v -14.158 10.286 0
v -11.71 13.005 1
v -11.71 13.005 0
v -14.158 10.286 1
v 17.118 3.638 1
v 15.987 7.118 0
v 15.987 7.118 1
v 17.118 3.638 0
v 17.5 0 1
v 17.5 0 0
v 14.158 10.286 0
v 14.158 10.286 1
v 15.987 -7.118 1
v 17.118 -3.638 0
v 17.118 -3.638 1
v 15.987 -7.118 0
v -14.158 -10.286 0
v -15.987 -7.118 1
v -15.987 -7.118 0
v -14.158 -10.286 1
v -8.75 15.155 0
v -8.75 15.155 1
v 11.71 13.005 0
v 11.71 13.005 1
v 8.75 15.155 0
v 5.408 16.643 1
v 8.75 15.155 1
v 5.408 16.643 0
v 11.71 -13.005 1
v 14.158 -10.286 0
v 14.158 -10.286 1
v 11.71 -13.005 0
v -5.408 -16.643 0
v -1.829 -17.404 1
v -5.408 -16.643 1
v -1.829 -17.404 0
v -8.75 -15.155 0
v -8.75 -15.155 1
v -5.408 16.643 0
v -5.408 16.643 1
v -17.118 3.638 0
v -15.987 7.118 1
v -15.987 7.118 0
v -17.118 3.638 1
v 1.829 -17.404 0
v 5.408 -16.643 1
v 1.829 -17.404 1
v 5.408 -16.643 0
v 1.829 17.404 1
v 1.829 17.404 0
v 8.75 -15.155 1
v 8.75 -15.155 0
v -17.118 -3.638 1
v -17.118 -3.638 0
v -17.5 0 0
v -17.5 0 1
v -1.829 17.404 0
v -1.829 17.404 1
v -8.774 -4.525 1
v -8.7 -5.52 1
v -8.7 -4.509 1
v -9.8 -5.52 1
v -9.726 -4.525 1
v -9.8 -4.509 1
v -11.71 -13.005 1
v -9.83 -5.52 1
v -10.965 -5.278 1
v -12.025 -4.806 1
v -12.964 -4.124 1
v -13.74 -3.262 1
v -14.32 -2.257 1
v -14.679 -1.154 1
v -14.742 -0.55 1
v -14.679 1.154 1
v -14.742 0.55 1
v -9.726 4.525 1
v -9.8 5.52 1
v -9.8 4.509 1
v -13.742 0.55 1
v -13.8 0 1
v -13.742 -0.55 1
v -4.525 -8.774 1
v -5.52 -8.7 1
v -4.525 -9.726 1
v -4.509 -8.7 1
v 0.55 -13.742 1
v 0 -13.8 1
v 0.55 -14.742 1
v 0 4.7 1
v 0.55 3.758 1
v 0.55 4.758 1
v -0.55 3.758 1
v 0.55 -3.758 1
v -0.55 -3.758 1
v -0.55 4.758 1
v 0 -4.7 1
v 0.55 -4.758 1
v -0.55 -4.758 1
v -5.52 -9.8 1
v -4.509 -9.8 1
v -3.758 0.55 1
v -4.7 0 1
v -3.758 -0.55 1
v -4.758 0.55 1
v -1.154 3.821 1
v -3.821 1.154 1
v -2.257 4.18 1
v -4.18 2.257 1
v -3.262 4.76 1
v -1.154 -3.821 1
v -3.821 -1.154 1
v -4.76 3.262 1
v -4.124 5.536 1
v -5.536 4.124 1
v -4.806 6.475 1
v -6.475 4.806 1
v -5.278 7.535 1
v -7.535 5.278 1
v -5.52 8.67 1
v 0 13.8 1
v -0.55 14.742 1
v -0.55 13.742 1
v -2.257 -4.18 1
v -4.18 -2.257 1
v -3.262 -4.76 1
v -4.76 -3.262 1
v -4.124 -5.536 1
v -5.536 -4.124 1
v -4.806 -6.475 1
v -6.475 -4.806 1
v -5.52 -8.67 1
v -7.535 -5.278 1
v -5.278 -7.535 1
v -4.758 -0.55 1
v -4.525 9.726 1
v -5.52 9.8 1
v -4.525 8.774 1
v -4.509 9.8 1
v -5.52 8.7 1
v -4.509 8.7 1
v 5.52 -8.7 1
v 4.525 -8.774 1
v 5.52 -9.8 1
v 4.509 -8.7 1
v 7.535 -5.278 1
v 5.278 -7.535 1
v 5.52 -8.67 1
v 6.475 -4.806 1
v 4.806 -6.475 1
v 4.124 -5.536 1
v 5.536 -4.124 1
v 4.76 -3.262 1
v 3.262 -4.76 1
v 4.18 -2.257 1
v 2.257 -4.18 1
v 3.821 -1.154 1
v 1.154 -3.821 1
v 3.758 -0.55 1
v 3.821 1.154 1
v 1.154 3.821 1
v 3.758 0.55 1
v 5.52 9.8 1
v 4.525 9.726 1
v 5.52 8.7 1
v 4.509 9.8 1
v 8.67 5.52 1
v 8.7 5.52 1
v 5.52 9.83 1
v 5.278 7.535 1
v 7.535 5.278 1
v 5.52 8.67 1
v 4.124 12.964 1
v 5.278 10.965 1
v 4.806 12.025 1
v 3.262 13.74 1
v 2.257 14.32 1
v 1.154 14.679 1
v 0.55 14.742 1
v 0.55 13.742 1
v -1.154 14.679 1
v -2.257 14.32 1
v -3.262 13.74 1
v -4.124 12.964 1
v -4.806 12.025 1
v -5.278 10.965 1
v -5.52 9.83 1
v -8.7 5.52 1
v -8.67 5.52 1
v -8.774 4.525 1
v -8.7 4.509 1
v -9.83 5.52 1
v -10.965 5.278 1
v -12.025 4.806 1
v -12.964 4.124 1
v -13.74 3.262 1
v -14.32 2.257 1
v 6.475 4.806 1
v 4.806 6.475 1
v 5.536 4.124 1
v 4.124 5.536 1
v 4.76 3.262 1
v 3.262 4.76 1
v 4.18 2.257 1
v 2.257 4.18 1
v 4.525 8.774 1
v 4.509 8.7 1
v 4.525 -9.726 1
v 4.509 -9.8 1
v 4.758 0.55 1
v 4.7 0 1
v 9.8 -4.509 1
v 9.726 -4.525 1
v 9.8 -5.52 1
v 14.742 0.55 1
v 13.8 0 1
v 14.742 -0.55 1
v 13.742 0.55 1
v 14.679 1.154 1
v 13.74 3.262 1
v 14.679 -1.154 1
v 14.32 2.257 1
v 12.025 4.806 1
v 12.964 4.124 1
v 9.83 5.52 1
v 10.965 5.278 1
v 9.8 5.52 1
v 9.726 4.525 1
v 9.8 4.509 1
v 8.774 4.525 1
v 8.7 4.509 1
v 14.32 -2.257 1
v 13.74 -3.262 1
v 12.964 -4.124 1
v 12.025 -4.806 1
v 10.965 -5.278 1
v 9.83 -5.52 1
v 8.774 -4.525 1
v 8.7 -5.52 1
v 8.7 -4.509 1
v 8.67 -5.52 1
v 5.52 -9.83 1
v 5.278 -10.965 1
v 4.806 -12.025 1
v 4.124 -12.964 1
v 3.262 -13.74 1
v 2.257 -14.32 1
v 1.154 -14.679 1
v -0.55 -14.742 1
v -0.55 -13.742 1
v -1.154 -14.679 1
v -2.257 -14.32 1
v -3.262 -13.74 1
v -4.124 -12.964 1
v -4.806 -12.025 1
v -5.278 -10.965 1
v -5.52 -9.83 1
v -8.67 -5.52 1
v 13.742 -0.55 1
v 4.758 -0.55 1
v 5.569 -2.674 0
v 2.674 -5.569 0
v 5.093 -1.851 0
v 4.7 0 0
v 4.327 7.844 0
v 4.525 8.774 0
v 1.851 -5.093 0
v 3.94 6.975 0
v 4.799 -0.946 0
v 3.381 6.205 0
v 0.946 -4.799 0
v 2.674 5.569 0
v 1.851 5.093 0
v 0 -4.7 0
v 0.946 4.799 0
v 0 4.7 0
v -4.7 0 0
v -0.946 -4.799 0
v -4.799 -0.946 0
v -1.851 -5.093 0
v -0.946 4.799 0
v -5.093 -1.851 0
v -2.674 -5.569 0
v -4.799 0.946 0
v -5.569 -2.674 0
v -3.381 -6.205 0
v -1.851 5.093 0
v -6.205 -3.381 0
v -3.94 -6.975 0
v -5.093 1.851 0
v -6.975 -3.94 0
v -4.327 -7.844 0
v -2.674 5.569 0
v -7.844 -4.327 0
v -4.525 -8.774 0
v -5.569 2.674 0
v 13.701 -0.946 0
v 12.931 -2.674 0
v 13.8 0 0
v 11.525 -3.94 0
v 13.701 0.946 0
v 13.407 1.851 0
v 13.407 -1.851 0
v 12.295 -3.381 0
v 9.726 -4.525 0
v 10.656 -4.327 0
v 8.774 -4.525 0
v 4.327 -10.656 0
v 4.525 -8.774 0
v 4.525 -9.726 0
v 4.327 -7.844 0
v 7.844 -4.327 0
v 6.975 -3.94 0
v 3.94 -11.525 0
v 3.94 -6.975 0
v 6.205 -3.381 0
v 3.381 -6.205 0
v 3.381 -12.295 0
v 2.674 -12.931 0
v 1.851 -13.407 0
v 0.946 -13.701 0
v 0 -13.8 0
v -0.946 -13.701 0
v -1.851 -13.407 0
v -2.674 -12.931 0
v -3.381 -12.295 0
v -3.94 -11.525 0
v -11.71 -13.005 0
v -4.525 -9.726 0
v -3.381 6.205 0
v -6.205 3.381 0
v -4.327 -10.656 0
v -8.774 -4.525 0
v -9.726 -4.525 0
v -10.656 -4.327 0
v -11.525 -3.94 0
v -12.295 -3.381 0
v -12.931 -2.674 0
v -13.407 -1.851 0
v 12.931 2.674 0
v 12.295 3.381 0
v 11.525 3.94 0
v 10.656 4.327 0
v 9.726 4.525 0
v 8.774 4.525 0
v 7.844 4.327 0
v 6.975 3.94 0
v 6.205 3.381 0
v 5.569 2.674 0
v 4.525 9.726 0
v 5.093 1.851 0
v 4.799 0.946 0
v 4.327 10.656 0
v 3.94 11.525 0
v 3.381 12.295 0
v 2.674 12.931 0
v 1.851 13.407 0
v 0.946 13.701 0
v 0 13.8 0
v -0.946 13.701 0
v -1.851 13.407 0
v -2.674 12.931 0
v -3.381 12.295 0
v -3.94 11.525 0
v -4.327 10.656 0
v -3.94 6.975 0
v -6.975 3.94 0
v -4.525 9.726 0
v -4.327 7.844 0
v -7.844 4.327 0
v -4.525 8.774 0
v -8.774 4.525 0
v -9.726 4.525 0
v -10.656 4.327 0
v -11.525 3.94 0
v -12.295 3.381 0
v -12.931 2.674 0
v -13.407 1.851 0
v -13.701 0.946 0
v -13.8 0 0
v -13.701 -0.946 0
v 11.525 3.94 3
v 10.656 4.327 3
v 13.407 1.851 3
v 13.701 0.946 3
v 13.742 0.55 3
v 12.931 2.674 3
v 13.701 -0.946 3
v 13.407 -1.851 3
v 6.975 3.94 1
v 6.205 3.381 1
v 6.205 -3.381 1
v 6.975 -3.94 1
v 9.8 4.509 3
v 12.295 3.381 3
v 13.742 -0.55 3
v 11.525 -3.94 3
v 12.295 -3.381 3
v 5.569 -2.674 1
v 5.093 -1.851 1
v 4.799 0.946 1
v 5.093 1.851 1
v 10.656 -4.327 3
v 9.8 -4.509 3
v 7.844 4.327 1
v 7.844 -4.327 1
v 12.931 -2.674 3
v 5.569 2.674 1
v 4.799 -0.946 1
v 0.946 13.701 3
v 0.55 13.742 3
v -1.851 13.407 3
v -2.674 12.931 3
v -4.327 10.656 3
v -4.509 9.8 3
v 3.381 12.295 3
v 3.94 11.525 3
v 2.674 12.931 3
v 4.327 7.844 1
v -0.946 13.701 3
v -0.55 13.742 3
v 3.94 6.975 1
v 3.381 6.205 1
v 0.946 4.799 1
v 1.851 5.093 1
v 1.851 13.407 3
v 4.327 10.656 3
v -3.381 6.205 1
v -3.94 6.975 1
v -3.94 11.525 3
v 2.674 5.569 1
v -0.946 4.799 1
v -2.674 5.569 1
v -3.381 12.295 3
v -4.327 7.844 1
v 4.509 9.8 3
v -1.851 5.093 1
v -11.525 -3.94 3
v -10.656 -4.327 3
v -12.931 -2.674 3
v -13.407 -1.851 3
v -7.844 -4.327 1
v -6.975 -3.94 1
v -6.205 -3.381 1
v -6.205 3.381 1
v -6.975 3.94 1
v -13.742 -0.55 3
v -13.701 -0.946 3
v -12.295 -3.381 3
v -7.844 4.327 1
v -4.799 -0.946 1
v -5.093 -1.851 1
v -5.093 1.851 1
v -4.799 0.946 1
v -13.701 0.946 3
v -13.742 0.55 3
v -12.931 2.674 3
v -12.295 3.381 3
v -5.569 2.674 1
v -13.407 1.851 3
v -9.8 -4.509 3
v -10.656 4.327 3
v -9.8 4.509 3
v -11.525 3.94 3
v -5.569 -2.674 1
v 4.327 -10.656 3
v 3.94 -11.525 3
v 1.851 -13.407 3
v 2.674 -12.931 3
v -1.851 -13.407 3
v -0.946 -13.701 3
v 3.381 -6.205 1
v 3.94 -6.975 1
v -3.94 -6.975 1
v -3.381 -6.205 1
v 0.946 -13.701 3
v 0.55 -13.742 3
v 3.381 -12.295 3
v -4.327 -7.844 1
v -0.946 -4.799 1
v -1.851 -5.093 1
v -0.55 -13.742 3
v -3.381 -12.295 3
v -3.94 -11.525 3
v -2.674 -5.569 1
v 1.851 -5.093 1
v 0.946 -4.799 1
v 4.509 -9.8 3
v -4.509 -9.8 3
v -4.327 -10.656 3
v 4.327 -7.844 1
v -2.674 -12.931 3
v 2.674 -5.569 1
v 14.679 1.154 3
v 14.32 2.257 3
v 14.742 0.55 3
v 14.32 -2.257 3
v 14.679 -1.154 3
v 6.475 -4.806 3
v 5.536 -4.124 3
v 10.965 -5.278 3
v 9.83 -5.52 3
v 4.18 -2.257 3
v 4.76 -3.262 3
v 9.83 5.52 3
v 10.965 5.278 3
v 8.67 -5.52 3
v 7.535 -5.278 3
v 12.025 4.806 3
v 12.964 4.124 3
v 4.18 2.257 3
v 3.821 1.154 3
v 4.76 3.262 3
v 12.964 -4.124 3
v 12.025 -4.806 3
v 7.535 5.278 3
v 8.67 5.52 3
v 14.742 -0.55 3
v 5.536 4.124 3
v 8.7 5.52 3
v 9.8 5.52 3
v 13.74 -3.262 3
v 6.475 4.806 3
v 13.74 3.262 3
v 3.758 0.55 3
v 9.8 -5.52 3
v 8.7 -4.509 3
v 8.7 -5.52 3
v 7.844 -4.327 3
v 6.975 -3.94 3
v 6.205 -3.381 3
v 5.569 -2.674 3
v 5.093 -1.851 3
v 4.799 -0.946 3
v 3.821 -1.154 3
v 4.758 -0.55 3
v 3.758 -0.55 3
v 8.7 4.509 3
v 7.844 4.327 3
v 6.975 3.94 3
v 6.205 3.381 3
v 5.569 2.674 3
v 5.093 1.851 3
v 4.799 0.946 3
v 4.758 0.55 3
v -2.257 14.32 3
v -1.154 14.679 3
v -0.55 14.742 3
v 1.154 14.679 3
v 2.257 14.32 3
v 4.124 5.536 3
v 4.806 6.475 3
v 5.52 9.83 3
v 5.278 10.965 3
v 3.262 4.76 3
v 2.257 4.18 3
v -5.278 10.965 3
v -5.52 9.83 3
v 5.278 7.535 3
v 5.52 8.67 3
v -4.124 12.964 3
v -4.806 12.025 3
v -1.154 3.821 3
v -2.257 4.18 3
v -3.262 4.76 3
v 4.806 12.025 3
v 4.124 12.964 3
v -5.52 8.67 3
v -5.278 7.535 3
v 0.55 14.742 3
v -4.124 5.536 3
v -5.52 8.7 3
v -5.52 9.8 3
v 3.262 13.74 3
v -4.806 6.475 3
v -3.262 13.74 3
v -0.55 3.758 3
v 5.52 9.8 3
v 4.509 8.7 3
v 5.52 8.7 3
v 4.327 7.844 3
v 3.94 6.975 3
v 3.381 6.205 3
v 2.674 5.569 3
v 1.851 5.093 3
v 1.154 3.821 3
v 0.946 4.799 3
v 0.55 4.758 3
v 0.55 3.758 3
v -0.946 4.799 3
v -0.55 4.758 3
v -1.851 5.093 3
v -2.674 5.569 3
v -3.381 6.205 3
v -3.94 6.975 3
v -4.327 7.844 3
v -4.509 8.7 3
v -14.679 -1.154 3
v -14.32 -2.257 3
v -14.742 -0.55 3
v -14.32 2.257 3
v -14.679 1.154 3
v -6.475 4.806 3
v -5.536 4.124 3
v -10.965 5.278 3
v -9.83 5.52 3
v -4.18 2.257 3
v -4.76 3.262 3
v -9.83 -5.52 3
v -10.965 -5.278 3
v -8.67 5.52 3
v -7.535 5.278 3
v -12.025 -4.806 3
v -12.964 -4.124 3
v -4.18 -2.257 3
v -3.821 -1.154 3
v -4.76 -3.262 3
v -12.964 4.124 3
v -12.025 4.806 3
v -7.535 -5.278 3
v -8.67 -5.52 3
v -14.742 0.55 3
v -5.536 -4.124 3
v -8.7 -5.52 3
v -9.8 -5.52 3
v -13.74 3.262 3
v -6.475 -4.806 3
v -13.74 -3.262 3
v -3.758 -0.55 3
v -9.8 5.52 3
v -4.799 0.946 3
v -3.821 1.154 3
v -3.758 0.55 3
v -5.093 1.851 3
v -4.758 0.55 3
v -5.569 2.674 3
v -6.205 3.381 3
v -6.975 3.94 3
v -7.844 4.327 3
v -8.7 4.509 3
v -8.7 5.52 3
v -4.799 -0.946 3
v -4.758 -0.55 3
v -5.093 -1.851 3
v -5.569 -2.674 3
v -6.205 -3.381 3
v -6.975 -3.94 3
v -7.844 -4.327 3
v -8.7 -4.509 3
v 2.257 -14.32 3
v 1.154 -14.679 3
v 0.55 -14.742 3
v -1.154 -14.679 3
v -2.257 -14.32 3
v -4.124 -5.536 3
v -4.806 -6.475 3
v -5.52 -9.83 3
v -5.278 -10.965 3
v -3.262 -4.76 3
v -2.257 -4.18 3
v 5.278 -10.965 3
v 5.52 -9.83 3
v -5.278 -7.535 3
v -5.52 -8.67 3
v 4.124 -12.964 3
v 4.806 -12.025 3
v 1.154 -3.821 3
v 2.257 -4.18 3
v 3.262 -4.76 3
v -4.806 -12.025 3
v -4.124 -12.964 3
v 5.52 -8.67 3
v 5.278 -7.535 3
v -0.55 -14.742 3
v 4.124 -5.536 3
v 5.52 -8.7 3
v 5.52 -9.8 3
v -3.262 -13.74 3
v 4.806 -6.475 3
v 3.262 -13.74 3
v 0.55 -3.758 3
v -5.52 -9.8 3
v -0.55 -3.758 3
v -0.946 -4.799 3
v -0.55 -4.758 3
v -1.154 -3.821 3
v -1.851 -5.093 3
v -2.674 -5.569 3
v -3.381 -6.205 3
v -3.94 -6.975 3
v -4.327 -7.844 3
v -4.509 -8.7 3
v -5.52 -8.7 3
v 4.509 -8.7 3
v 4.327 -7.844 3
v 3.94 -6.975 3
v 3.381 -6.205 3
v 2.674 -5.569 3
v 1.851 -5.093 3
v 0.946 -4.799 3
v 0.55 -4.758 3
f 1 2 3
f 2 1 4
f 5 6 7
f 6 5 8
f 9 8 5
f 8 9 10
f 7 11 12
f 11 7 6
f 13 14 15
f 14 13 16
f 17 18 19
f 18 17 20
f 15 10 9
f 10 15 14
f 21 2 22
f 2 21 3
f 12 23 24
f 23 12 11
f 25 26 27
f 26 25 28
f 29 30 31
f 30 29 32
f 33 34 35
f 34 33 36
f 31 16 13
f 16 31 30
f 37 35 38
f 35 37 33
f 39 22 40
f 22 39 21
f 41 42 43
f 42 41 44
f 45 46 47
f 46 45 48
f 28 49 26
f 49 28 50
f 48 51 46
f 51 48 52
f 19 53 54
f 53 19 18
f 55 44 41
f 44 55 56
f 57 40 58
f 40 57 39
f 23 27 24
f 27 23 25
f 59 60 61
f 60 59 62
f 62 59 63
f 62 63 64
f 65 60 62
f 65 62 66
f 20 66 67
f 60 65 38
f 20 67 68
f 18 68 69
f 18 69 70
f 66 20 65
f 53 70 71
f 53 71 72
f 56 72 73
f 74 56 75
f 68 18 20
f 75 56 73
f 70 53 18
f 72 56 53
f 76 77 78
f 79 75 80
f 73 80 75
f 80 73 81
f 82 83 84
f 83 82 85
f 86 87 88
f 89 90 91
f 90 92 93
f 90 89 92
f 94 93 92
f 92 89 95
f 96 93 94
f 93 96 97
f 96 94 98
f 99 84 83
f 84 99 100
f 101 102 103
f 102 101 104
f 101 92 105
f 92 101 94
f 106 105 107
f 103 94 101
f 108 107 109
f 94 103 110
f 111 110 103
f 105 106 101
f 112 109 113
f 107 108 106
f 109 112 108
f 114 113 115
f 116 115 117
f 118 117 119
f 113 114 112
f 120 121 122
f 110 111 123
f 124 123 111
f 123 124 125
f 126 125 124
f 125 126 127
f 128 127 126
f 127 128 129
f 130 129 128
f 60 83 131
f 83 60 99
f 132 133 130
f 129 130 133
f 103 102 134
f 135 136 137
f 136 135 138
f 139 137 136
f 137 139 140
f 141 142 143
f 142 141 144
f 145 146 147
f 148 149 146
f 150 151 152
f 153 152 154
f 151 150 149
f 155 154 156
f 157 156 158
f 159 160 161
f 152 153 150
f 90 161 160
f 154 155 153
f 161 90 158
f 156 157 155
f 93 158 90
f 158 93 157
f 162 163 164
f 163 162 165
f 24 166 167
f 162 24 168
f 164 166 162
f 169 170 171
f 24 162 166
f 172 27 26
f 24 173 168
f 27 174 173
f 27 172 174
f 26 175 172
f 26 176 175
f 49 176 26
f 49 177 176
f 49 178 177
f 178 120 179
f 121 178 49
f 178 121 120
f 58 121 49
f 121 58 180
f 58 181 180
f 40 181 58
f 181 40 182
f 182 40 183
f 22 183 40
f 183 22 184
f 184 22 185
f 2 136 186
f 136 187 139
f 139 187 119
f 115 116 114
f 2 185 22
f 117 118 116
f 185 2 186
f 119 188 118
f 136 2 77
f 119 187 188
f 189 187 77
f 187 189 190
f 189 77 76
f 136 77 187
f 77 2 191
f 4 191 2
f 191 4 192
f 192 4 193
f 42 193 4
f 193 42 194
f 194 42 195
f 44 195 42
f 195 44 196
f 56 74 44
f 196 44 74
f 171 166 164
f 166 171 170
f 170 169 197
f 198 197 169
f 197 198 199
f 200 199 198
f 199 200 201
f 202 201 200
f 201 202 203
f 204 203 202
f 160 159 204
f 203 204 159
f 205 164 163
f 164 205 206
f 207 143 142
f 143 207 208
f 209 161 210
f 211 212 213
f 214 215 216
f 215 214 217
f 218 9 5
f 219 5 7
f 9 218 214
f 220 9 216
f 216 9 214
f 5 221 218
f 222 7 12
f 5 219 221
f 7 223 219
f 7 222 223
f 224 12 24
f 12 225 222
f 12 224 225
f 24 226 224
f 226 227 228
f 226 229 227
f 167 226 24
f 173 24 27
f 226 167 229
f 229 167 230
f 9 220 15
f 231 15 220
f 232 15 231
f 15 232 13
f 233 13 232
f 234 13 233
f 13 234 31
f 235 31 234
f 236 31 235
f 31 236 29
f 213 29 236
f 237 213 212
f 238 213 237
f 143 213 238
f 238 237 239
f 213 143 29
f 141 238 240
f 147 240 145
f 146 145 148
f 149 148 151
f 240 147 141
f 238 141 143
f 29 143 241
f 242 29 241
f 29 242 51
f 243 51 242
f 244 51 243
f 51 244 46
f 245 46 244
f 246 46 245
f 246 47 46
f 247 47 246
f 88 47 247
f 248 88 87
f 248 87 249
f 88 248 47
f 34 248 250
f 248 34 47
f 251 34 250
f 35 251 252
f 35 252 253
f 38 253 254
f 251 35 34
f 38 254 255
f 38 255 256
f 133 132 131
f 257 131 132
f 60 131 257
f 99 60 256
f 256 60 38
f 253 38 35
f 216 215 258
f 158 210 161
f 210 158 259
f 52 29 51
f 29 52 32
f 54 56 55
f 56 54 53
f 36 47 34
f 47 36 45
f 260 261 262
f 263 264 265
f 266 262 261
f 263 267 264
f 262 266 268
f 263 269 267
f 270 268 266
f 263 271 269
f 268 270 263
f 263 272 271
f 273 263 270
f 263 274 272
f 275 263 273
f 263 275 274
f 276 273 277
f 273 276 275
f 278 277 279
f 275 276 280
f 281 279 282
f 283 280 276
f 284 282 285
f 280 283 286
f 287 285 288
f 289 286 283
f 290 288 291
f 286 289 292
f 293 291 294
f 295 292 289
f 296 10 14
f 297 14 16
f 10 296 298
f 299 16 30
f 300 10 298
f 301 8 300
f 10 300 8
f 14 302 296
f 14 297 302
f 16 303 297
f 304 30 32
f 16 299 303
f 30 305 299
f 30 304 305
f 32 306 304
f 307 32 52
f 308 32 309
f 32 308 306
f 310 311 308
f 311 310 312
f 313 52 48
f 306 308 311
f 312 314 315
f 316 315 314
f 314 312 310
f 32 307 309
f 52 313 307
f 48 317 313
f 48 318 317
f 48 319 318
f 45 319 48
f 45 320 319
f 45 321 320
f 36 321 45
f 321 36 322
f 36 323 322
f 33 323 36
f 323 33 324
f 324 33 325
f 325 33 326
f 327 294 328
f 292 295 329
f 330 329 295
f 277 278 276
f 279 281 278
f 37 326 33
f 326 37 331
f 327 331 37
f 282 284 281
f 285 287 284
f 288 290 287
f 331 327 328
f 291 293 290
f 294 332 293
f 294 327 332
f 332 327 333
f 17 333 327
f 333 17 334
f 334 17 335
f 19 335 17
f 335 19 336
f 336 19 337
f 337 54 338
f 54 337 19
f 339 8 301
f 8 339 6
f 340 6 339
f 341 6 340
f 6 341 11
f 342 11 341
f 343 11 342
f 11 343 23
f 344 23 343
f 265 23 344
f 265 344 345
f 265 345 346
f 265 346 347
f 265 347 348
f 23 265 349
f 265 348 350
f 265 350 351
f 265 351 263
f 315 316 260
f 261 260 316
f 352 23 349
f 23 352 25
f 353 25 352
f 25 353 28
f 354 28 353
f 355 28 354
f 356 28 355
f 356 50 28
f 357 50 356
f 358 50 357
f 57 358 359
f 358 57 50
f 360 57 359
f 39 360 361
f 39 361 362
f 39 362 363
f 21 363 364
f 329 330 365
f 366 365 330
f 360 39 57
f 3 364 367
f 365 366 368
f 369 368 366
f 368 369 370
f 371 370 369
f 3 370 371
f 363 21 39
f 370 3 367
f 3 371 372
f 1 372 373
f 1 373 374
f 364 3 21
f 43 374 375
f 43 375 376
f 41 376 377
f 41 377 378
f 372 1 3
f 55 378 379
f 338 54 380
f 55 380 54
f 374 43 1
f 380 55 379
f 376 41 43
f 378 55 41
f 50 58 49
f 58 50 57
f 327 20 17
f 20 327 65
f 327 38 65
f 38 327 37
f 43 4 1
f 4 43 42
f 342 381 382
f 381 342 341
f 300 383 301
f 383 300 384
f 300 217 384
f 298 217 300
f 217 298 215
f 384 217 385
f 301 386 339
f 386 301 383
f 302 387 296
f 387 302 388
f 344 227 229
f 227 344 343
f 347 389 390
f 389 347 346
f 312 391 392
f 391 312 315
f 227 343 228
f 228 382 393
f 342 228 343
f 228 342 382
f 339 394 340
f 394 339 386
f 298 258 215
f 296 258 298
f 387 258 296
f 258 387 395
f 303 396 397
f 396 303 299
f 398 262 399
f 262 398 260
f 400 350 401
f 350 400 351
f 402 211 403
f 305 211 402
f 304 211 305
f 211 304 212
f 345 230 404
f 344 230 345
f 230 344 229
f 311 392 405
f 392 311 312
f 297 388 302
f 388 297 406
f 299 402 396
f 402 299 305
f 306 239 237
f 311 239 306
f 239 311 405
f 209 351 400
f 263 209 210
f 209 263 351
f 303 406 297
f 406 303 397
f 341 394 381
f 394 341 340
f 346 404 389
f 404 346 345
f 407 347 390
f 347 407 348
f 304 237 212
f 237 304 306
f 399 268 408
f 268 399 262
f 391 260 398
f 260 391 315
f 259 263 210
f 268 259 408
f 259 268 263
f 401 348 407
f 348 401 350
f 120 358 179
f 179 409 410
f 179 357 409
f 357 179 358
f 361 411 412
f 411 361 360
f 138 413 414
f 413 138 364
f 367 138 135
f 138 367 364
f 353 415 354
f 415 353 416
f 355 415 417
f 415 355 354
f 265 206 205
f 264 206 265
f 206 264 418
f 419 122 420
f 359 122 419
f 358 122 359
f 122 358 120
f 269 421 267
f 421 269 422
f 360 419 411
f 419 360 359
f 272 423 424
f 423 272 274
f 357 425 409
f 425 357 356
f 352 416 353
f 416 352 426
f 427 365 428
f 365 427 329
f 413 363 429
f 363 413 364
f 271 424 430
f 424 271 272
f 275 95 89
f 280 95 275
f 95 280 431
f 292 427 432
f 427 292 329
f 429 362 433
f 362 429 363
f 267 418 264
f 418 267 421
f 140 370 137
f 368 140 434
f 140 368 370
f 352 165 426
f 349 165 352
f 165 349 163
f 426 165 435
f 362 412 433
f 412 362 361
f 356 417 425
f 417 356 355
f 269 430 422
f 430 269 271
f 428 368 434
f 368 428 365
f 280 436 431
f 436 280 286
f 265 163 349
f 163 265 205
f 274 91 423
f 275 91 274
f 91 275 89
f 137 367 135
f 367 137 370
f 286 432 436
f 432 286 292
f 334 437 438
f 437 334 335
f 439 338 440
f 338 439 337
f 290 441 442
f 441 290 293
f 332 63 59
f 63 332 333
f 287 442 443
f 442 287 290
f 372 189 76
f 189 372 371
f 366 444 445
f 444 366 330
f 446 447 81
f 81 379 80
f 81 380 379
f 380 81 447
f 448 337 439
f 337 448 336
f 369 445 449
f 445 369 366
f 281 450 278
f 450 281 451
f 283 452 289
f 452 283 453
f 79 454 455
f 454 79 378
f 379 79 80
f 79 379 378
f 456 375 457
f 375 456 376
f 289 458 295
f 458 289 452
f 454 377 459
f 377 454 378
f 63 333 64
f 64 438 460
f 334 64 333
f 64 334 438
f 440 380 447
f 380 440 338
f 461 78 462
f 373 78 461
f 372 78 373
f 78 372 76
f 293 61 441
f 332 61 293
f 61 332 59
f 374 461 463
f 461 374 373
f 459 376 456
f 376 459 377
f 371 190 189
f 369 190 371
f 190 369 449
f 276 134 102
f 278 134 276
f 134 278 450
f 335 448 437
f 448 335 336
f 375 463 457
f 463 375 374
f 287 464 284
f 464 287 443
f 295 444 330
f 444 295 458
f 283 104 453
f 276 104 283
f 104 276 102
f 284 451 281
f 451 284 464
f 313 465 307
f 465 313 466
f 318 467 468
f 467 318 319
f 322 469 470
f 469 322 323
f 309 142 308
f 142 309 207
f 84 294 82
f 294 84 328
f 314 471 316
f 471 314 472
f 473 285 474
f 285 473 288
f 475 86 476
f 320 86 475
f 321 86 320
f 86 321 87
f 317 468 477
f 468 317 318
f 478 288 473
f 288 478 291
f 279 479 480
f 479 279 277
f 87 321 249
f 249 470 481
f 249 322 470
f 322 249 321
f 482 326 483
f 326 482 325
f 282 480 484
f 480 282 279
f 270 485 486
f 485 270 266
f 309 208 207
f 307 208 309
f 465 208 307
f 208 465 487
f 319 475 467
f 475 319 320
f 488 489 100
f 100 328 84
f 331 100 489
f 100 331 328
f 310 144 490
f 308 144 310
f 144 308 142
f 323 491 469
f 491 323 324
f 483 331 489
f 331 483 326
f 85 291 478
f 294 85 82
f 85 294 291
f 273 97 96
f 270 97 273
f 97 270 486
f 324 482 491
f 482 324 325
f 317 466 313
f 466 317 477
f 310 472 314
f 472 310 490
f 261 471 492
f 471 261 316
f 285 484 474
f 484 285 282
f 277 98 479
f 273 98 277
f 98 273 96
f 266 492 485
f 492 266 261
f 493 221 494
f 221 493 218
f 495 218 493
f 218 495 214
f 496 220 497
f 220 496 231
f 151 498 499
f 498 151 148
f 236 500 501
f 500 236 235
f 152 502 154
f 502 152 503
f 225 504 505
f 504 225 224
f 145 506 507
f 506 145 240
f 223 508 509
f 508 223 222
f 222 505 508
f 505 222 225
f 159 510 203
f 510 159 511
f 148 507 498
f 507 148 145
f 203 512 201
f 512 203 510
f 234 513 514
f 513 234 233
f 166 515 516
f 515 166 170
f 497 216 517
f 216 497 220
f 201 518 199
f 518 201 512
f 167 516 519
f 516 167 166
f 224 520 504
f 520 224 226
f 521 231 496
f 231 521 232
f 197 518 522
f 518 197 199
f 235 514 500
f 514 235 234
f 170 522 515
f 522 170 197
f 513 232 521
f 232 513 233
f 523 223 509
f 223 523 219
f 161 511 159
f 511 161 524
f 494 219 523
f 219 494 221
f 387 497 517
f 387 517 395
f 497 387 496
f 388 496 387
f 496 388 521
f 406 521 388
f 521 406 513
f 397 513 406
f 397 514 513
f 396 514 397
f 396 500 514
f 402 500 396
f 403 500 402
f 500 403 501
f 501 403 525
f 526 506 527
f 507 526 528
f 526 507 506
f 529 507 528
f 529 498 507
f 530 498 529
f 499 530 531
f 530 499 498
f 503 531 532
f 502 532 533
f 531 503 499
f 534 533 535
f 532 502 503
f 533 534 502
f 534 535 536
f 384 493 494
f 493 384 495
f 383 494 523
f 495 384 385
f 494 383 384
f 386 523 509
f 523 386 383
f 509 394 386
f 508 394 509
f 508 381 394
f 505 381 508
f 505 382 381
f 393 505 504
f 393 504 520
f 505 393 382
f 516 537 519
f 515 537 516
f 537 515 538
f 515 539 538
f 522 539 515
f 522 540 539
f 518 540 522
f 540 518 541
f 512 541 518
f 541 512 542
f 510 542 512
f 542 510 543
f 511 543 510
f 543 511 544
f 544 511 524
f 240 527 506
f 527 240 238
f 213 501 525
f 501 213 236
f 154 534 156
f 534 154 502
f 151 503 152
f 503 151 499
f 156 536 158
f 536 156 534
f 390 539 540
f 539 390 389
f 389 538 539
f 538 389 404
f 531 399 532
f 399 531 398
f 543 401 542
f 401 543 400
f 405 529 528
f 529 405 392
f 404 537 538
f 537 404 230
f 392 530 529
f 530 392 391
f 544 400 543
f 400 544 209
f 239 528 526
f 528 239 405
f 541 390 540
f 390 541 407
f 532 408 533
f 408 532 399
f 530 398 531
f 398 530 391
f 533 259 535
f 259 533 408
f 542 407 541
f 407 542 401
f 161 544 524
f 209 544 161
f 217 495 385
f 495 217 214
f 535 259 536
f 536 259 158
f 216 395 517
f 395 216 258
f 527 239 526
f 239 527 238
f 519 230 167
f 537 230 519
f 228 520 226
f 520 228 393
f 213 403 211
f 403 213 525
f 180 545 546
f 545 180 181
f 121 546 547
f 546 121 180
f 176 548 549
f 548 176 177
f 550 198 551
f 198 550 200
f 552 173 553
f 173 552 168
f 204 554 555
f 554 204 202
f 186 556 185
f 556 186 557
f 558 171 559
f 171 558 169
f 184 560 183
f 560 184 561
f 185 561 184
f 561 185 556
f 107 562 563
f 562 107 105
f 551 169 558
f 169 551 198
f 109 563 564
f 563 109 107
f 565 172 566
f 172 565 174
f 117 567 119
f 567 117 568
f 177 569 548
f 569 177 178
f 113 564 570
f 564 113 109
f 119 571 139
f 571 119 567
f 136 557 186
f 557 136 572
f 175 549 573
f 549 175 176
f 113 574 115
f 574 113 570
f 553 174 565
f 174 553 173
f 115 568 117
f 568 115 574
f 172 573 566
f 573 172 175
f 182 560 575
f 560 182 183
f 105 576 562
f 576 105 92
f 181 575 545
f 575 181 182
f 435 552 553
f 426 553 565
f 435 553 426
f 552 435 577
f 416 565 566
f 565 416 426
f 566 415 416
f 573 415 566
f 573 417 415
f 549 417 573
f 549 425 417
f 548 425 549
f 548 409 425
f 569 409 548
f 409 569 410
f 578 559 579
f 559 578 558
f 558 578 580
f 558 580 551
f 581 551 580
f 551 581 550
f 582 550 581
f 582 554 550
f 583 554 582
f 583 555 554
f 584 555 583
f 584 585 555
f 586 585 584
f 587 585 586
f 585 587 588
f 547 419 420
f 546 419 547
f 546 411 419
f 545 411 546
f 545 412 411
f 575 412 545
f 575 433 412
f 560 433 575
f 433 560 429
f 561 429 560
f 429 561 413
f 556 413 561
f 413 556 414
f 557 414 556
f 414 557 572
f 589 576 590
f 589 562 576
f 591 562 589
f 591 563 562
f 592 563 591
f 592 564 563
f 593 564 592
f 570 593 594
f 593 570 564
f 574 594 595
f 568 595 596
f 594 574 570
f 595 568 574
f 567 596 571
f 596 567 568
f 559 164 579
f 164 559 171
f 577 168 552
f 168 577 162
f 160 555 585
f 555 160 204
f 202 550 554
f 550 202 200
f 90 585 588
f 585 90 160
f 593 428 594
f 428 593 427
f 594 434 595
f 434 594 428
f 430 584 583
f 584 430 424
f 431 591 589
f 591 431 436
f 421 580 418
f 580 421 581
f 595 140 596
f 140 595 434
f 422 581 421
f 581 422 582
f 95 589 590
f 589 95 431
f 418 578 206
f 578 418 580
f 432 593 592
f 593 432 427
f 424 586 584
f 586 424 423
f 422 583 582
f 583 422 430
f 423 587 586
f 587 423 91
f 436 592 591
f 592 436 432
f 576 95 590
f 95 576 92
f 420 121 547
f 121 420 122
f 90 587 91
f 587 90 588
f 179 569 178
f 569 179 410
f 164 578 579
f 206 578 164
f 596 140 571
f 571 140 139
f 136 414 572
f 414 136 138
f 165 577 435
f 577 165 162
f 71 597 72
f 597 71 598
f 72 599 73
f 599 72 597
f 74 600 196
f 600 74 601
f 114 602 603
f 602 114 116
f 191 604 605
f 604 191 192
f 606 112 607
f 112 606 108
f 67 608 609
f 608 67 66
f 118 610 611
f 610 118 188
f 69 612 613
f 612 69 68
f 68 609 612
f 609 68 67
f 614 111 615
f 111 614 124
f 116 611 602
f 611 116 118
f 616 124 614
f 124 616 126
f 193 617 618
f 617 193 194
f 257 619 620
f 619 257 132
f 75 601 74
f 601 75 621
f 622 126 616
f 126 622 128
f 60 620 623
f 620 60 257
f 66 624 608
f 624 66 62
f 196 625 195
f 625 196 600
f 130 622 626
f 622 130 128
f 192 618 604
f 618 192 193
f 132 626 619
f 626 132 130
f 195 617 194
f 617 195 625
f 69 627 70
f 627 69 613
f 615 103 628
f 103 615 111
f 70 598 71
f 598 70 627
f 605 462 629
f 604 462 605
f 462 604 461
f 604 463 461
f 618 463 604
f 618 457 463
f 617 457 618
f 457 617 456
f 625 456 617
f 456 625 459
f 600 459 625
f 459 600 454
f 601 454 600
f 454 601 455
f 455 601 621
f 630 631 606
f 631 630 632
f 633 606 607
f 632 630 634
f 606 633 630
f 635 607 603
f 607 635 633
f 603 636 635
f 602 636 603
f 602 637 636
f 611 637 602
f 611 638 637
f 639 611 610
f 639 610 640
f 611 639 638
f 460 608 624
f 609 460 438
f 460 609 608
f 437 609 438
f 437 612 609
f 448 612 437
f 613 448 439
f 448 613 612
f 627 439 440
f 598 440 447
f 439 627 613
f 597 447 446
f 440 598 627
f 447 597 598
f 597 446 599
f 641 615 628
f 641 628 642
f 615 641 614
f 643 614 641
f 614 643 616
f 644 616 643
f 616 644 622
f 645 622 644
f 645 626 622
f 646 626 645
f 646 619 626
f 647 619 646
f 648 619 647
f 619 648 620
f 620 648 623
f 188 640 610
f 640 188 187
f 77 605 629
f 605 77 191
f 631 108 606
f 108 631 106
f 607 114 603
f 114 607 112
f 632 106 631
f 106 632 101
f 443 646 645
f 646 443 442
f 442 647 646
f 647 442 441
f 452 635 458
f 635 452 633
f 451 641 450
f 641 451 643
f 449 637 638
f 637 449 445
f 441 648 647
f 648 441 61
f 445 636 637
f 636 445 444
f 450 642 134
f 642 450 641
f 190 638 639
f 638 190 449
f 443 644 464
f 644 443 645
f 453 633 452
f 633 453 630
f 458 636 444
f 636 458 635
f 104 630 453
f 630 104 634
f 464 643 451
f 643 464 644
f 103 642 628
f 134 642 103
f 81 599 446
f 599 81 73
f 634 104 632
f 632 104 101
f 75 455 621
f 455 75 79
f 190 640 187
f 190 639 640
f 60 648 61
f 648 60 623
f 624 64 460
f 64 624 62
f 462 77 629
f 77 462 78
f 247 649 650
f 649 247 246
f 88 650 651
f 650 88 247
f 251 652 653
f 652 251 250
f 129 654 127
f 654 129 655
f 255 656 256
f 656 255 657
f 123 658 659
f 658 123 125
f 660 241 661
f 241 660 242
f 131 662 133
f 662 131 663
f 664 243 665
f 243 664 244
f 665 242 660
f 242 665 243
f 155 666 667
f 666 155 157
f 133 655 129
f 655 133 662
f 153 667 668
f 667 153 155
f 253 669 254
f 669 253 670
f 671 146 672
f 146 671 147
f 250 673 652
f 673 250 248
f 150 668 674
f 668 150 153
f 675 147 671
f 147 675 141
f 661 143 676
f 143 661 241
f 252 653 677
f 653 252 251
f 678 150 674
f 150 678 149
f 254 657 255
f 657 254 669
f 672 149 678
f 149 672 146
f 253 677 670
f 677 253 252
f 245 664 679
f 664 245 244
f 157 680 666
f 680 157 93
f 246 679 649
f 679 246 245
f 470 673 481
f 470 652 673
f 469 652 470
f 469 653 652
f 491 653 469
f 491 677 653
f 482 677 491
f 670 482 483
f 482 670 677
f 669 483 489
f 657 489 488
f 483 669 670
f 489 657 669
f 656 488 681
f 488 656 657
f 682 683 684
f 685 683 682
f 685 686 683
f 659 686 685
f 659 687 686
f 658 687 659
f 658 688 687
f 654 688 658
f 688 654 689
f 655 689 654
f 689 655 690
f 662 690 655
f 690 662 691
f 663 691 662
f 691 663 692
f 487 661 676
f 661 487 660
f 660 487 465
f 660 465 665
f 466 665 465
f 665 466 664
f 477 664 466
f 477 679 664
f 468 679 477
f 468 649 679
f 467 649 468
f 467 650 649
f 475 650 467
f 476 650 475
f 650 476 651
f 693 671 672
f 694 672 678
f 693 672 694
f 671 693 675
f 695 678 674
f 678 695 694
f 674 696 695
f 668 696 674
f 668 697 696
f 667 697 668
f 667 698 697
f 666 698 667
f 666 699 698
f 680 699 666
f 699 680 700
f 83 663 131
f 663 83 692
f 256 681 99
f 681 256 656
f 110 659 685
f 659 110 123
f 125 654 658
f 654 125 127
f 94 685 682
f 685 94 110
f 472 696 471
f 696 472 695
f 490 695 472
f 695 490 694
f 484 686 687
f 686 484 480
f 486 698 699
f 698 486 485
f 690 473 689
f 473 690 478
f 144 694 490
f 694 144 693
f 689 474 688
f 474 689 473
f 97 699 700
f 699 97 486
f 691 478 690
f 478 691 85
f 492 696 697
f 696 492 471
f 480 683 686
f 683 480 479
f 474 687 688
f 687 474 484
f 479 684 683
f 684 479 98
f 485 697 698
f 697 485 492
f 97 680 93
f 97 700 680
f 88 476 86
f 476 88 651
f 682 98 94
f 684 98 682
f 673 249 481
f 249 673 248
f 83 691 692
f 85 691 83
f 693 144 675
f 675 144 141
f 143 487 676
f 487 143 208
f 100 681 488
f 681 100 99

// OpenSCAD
$fs = .4;

R = 35 / 2; // Holder radius (equal to touchpad radius).
BR = 9.1 / 2; // Button hole radius.
T = 1; // Thickness.
M = 3.7; // Margin between holder boundary and button hole.
TTUBE = 1; // Thickness of the tube wall.
HTUBE = 2; // Thickness of the tube wall.
WRAIL = 1.1; // Width of the rail cutout.

module button_hole() {
  translate([R - M - BR, 0, -.1])
    cylinder(h=T + .2, r=BR);
}

module rail() {
  translate([-BR - TTUBE - .1, -WRAIL / 2, -.1])
    cube([(BR + TTUBE + .1) * 2, WRAIL, HTUBE + .2]);
}

module tube() {
  translate([R - M - BR, 0, T])
    difference() {
      cylinder(h=HTUBE, r=BR + TTUBE);
      translate([0, 0, -.1])
        cylinder(h=HTUBE + .2, r=BR);
      rail();
      rotate(90) rail();
    }
}

module button_holder() {
  color("#1a1c2c") union() {
      difference() {
        cylinder(h=T, r=R);
        button_hole();
        rotate(90) button_hole();
        rotate(180) button_hole();
        rotate(270) button_hole();
      }
      tube();
      rotate(90) tube();
      rotate(180) tube();
      rotate(270) tube();
    }
}

button_holder();
